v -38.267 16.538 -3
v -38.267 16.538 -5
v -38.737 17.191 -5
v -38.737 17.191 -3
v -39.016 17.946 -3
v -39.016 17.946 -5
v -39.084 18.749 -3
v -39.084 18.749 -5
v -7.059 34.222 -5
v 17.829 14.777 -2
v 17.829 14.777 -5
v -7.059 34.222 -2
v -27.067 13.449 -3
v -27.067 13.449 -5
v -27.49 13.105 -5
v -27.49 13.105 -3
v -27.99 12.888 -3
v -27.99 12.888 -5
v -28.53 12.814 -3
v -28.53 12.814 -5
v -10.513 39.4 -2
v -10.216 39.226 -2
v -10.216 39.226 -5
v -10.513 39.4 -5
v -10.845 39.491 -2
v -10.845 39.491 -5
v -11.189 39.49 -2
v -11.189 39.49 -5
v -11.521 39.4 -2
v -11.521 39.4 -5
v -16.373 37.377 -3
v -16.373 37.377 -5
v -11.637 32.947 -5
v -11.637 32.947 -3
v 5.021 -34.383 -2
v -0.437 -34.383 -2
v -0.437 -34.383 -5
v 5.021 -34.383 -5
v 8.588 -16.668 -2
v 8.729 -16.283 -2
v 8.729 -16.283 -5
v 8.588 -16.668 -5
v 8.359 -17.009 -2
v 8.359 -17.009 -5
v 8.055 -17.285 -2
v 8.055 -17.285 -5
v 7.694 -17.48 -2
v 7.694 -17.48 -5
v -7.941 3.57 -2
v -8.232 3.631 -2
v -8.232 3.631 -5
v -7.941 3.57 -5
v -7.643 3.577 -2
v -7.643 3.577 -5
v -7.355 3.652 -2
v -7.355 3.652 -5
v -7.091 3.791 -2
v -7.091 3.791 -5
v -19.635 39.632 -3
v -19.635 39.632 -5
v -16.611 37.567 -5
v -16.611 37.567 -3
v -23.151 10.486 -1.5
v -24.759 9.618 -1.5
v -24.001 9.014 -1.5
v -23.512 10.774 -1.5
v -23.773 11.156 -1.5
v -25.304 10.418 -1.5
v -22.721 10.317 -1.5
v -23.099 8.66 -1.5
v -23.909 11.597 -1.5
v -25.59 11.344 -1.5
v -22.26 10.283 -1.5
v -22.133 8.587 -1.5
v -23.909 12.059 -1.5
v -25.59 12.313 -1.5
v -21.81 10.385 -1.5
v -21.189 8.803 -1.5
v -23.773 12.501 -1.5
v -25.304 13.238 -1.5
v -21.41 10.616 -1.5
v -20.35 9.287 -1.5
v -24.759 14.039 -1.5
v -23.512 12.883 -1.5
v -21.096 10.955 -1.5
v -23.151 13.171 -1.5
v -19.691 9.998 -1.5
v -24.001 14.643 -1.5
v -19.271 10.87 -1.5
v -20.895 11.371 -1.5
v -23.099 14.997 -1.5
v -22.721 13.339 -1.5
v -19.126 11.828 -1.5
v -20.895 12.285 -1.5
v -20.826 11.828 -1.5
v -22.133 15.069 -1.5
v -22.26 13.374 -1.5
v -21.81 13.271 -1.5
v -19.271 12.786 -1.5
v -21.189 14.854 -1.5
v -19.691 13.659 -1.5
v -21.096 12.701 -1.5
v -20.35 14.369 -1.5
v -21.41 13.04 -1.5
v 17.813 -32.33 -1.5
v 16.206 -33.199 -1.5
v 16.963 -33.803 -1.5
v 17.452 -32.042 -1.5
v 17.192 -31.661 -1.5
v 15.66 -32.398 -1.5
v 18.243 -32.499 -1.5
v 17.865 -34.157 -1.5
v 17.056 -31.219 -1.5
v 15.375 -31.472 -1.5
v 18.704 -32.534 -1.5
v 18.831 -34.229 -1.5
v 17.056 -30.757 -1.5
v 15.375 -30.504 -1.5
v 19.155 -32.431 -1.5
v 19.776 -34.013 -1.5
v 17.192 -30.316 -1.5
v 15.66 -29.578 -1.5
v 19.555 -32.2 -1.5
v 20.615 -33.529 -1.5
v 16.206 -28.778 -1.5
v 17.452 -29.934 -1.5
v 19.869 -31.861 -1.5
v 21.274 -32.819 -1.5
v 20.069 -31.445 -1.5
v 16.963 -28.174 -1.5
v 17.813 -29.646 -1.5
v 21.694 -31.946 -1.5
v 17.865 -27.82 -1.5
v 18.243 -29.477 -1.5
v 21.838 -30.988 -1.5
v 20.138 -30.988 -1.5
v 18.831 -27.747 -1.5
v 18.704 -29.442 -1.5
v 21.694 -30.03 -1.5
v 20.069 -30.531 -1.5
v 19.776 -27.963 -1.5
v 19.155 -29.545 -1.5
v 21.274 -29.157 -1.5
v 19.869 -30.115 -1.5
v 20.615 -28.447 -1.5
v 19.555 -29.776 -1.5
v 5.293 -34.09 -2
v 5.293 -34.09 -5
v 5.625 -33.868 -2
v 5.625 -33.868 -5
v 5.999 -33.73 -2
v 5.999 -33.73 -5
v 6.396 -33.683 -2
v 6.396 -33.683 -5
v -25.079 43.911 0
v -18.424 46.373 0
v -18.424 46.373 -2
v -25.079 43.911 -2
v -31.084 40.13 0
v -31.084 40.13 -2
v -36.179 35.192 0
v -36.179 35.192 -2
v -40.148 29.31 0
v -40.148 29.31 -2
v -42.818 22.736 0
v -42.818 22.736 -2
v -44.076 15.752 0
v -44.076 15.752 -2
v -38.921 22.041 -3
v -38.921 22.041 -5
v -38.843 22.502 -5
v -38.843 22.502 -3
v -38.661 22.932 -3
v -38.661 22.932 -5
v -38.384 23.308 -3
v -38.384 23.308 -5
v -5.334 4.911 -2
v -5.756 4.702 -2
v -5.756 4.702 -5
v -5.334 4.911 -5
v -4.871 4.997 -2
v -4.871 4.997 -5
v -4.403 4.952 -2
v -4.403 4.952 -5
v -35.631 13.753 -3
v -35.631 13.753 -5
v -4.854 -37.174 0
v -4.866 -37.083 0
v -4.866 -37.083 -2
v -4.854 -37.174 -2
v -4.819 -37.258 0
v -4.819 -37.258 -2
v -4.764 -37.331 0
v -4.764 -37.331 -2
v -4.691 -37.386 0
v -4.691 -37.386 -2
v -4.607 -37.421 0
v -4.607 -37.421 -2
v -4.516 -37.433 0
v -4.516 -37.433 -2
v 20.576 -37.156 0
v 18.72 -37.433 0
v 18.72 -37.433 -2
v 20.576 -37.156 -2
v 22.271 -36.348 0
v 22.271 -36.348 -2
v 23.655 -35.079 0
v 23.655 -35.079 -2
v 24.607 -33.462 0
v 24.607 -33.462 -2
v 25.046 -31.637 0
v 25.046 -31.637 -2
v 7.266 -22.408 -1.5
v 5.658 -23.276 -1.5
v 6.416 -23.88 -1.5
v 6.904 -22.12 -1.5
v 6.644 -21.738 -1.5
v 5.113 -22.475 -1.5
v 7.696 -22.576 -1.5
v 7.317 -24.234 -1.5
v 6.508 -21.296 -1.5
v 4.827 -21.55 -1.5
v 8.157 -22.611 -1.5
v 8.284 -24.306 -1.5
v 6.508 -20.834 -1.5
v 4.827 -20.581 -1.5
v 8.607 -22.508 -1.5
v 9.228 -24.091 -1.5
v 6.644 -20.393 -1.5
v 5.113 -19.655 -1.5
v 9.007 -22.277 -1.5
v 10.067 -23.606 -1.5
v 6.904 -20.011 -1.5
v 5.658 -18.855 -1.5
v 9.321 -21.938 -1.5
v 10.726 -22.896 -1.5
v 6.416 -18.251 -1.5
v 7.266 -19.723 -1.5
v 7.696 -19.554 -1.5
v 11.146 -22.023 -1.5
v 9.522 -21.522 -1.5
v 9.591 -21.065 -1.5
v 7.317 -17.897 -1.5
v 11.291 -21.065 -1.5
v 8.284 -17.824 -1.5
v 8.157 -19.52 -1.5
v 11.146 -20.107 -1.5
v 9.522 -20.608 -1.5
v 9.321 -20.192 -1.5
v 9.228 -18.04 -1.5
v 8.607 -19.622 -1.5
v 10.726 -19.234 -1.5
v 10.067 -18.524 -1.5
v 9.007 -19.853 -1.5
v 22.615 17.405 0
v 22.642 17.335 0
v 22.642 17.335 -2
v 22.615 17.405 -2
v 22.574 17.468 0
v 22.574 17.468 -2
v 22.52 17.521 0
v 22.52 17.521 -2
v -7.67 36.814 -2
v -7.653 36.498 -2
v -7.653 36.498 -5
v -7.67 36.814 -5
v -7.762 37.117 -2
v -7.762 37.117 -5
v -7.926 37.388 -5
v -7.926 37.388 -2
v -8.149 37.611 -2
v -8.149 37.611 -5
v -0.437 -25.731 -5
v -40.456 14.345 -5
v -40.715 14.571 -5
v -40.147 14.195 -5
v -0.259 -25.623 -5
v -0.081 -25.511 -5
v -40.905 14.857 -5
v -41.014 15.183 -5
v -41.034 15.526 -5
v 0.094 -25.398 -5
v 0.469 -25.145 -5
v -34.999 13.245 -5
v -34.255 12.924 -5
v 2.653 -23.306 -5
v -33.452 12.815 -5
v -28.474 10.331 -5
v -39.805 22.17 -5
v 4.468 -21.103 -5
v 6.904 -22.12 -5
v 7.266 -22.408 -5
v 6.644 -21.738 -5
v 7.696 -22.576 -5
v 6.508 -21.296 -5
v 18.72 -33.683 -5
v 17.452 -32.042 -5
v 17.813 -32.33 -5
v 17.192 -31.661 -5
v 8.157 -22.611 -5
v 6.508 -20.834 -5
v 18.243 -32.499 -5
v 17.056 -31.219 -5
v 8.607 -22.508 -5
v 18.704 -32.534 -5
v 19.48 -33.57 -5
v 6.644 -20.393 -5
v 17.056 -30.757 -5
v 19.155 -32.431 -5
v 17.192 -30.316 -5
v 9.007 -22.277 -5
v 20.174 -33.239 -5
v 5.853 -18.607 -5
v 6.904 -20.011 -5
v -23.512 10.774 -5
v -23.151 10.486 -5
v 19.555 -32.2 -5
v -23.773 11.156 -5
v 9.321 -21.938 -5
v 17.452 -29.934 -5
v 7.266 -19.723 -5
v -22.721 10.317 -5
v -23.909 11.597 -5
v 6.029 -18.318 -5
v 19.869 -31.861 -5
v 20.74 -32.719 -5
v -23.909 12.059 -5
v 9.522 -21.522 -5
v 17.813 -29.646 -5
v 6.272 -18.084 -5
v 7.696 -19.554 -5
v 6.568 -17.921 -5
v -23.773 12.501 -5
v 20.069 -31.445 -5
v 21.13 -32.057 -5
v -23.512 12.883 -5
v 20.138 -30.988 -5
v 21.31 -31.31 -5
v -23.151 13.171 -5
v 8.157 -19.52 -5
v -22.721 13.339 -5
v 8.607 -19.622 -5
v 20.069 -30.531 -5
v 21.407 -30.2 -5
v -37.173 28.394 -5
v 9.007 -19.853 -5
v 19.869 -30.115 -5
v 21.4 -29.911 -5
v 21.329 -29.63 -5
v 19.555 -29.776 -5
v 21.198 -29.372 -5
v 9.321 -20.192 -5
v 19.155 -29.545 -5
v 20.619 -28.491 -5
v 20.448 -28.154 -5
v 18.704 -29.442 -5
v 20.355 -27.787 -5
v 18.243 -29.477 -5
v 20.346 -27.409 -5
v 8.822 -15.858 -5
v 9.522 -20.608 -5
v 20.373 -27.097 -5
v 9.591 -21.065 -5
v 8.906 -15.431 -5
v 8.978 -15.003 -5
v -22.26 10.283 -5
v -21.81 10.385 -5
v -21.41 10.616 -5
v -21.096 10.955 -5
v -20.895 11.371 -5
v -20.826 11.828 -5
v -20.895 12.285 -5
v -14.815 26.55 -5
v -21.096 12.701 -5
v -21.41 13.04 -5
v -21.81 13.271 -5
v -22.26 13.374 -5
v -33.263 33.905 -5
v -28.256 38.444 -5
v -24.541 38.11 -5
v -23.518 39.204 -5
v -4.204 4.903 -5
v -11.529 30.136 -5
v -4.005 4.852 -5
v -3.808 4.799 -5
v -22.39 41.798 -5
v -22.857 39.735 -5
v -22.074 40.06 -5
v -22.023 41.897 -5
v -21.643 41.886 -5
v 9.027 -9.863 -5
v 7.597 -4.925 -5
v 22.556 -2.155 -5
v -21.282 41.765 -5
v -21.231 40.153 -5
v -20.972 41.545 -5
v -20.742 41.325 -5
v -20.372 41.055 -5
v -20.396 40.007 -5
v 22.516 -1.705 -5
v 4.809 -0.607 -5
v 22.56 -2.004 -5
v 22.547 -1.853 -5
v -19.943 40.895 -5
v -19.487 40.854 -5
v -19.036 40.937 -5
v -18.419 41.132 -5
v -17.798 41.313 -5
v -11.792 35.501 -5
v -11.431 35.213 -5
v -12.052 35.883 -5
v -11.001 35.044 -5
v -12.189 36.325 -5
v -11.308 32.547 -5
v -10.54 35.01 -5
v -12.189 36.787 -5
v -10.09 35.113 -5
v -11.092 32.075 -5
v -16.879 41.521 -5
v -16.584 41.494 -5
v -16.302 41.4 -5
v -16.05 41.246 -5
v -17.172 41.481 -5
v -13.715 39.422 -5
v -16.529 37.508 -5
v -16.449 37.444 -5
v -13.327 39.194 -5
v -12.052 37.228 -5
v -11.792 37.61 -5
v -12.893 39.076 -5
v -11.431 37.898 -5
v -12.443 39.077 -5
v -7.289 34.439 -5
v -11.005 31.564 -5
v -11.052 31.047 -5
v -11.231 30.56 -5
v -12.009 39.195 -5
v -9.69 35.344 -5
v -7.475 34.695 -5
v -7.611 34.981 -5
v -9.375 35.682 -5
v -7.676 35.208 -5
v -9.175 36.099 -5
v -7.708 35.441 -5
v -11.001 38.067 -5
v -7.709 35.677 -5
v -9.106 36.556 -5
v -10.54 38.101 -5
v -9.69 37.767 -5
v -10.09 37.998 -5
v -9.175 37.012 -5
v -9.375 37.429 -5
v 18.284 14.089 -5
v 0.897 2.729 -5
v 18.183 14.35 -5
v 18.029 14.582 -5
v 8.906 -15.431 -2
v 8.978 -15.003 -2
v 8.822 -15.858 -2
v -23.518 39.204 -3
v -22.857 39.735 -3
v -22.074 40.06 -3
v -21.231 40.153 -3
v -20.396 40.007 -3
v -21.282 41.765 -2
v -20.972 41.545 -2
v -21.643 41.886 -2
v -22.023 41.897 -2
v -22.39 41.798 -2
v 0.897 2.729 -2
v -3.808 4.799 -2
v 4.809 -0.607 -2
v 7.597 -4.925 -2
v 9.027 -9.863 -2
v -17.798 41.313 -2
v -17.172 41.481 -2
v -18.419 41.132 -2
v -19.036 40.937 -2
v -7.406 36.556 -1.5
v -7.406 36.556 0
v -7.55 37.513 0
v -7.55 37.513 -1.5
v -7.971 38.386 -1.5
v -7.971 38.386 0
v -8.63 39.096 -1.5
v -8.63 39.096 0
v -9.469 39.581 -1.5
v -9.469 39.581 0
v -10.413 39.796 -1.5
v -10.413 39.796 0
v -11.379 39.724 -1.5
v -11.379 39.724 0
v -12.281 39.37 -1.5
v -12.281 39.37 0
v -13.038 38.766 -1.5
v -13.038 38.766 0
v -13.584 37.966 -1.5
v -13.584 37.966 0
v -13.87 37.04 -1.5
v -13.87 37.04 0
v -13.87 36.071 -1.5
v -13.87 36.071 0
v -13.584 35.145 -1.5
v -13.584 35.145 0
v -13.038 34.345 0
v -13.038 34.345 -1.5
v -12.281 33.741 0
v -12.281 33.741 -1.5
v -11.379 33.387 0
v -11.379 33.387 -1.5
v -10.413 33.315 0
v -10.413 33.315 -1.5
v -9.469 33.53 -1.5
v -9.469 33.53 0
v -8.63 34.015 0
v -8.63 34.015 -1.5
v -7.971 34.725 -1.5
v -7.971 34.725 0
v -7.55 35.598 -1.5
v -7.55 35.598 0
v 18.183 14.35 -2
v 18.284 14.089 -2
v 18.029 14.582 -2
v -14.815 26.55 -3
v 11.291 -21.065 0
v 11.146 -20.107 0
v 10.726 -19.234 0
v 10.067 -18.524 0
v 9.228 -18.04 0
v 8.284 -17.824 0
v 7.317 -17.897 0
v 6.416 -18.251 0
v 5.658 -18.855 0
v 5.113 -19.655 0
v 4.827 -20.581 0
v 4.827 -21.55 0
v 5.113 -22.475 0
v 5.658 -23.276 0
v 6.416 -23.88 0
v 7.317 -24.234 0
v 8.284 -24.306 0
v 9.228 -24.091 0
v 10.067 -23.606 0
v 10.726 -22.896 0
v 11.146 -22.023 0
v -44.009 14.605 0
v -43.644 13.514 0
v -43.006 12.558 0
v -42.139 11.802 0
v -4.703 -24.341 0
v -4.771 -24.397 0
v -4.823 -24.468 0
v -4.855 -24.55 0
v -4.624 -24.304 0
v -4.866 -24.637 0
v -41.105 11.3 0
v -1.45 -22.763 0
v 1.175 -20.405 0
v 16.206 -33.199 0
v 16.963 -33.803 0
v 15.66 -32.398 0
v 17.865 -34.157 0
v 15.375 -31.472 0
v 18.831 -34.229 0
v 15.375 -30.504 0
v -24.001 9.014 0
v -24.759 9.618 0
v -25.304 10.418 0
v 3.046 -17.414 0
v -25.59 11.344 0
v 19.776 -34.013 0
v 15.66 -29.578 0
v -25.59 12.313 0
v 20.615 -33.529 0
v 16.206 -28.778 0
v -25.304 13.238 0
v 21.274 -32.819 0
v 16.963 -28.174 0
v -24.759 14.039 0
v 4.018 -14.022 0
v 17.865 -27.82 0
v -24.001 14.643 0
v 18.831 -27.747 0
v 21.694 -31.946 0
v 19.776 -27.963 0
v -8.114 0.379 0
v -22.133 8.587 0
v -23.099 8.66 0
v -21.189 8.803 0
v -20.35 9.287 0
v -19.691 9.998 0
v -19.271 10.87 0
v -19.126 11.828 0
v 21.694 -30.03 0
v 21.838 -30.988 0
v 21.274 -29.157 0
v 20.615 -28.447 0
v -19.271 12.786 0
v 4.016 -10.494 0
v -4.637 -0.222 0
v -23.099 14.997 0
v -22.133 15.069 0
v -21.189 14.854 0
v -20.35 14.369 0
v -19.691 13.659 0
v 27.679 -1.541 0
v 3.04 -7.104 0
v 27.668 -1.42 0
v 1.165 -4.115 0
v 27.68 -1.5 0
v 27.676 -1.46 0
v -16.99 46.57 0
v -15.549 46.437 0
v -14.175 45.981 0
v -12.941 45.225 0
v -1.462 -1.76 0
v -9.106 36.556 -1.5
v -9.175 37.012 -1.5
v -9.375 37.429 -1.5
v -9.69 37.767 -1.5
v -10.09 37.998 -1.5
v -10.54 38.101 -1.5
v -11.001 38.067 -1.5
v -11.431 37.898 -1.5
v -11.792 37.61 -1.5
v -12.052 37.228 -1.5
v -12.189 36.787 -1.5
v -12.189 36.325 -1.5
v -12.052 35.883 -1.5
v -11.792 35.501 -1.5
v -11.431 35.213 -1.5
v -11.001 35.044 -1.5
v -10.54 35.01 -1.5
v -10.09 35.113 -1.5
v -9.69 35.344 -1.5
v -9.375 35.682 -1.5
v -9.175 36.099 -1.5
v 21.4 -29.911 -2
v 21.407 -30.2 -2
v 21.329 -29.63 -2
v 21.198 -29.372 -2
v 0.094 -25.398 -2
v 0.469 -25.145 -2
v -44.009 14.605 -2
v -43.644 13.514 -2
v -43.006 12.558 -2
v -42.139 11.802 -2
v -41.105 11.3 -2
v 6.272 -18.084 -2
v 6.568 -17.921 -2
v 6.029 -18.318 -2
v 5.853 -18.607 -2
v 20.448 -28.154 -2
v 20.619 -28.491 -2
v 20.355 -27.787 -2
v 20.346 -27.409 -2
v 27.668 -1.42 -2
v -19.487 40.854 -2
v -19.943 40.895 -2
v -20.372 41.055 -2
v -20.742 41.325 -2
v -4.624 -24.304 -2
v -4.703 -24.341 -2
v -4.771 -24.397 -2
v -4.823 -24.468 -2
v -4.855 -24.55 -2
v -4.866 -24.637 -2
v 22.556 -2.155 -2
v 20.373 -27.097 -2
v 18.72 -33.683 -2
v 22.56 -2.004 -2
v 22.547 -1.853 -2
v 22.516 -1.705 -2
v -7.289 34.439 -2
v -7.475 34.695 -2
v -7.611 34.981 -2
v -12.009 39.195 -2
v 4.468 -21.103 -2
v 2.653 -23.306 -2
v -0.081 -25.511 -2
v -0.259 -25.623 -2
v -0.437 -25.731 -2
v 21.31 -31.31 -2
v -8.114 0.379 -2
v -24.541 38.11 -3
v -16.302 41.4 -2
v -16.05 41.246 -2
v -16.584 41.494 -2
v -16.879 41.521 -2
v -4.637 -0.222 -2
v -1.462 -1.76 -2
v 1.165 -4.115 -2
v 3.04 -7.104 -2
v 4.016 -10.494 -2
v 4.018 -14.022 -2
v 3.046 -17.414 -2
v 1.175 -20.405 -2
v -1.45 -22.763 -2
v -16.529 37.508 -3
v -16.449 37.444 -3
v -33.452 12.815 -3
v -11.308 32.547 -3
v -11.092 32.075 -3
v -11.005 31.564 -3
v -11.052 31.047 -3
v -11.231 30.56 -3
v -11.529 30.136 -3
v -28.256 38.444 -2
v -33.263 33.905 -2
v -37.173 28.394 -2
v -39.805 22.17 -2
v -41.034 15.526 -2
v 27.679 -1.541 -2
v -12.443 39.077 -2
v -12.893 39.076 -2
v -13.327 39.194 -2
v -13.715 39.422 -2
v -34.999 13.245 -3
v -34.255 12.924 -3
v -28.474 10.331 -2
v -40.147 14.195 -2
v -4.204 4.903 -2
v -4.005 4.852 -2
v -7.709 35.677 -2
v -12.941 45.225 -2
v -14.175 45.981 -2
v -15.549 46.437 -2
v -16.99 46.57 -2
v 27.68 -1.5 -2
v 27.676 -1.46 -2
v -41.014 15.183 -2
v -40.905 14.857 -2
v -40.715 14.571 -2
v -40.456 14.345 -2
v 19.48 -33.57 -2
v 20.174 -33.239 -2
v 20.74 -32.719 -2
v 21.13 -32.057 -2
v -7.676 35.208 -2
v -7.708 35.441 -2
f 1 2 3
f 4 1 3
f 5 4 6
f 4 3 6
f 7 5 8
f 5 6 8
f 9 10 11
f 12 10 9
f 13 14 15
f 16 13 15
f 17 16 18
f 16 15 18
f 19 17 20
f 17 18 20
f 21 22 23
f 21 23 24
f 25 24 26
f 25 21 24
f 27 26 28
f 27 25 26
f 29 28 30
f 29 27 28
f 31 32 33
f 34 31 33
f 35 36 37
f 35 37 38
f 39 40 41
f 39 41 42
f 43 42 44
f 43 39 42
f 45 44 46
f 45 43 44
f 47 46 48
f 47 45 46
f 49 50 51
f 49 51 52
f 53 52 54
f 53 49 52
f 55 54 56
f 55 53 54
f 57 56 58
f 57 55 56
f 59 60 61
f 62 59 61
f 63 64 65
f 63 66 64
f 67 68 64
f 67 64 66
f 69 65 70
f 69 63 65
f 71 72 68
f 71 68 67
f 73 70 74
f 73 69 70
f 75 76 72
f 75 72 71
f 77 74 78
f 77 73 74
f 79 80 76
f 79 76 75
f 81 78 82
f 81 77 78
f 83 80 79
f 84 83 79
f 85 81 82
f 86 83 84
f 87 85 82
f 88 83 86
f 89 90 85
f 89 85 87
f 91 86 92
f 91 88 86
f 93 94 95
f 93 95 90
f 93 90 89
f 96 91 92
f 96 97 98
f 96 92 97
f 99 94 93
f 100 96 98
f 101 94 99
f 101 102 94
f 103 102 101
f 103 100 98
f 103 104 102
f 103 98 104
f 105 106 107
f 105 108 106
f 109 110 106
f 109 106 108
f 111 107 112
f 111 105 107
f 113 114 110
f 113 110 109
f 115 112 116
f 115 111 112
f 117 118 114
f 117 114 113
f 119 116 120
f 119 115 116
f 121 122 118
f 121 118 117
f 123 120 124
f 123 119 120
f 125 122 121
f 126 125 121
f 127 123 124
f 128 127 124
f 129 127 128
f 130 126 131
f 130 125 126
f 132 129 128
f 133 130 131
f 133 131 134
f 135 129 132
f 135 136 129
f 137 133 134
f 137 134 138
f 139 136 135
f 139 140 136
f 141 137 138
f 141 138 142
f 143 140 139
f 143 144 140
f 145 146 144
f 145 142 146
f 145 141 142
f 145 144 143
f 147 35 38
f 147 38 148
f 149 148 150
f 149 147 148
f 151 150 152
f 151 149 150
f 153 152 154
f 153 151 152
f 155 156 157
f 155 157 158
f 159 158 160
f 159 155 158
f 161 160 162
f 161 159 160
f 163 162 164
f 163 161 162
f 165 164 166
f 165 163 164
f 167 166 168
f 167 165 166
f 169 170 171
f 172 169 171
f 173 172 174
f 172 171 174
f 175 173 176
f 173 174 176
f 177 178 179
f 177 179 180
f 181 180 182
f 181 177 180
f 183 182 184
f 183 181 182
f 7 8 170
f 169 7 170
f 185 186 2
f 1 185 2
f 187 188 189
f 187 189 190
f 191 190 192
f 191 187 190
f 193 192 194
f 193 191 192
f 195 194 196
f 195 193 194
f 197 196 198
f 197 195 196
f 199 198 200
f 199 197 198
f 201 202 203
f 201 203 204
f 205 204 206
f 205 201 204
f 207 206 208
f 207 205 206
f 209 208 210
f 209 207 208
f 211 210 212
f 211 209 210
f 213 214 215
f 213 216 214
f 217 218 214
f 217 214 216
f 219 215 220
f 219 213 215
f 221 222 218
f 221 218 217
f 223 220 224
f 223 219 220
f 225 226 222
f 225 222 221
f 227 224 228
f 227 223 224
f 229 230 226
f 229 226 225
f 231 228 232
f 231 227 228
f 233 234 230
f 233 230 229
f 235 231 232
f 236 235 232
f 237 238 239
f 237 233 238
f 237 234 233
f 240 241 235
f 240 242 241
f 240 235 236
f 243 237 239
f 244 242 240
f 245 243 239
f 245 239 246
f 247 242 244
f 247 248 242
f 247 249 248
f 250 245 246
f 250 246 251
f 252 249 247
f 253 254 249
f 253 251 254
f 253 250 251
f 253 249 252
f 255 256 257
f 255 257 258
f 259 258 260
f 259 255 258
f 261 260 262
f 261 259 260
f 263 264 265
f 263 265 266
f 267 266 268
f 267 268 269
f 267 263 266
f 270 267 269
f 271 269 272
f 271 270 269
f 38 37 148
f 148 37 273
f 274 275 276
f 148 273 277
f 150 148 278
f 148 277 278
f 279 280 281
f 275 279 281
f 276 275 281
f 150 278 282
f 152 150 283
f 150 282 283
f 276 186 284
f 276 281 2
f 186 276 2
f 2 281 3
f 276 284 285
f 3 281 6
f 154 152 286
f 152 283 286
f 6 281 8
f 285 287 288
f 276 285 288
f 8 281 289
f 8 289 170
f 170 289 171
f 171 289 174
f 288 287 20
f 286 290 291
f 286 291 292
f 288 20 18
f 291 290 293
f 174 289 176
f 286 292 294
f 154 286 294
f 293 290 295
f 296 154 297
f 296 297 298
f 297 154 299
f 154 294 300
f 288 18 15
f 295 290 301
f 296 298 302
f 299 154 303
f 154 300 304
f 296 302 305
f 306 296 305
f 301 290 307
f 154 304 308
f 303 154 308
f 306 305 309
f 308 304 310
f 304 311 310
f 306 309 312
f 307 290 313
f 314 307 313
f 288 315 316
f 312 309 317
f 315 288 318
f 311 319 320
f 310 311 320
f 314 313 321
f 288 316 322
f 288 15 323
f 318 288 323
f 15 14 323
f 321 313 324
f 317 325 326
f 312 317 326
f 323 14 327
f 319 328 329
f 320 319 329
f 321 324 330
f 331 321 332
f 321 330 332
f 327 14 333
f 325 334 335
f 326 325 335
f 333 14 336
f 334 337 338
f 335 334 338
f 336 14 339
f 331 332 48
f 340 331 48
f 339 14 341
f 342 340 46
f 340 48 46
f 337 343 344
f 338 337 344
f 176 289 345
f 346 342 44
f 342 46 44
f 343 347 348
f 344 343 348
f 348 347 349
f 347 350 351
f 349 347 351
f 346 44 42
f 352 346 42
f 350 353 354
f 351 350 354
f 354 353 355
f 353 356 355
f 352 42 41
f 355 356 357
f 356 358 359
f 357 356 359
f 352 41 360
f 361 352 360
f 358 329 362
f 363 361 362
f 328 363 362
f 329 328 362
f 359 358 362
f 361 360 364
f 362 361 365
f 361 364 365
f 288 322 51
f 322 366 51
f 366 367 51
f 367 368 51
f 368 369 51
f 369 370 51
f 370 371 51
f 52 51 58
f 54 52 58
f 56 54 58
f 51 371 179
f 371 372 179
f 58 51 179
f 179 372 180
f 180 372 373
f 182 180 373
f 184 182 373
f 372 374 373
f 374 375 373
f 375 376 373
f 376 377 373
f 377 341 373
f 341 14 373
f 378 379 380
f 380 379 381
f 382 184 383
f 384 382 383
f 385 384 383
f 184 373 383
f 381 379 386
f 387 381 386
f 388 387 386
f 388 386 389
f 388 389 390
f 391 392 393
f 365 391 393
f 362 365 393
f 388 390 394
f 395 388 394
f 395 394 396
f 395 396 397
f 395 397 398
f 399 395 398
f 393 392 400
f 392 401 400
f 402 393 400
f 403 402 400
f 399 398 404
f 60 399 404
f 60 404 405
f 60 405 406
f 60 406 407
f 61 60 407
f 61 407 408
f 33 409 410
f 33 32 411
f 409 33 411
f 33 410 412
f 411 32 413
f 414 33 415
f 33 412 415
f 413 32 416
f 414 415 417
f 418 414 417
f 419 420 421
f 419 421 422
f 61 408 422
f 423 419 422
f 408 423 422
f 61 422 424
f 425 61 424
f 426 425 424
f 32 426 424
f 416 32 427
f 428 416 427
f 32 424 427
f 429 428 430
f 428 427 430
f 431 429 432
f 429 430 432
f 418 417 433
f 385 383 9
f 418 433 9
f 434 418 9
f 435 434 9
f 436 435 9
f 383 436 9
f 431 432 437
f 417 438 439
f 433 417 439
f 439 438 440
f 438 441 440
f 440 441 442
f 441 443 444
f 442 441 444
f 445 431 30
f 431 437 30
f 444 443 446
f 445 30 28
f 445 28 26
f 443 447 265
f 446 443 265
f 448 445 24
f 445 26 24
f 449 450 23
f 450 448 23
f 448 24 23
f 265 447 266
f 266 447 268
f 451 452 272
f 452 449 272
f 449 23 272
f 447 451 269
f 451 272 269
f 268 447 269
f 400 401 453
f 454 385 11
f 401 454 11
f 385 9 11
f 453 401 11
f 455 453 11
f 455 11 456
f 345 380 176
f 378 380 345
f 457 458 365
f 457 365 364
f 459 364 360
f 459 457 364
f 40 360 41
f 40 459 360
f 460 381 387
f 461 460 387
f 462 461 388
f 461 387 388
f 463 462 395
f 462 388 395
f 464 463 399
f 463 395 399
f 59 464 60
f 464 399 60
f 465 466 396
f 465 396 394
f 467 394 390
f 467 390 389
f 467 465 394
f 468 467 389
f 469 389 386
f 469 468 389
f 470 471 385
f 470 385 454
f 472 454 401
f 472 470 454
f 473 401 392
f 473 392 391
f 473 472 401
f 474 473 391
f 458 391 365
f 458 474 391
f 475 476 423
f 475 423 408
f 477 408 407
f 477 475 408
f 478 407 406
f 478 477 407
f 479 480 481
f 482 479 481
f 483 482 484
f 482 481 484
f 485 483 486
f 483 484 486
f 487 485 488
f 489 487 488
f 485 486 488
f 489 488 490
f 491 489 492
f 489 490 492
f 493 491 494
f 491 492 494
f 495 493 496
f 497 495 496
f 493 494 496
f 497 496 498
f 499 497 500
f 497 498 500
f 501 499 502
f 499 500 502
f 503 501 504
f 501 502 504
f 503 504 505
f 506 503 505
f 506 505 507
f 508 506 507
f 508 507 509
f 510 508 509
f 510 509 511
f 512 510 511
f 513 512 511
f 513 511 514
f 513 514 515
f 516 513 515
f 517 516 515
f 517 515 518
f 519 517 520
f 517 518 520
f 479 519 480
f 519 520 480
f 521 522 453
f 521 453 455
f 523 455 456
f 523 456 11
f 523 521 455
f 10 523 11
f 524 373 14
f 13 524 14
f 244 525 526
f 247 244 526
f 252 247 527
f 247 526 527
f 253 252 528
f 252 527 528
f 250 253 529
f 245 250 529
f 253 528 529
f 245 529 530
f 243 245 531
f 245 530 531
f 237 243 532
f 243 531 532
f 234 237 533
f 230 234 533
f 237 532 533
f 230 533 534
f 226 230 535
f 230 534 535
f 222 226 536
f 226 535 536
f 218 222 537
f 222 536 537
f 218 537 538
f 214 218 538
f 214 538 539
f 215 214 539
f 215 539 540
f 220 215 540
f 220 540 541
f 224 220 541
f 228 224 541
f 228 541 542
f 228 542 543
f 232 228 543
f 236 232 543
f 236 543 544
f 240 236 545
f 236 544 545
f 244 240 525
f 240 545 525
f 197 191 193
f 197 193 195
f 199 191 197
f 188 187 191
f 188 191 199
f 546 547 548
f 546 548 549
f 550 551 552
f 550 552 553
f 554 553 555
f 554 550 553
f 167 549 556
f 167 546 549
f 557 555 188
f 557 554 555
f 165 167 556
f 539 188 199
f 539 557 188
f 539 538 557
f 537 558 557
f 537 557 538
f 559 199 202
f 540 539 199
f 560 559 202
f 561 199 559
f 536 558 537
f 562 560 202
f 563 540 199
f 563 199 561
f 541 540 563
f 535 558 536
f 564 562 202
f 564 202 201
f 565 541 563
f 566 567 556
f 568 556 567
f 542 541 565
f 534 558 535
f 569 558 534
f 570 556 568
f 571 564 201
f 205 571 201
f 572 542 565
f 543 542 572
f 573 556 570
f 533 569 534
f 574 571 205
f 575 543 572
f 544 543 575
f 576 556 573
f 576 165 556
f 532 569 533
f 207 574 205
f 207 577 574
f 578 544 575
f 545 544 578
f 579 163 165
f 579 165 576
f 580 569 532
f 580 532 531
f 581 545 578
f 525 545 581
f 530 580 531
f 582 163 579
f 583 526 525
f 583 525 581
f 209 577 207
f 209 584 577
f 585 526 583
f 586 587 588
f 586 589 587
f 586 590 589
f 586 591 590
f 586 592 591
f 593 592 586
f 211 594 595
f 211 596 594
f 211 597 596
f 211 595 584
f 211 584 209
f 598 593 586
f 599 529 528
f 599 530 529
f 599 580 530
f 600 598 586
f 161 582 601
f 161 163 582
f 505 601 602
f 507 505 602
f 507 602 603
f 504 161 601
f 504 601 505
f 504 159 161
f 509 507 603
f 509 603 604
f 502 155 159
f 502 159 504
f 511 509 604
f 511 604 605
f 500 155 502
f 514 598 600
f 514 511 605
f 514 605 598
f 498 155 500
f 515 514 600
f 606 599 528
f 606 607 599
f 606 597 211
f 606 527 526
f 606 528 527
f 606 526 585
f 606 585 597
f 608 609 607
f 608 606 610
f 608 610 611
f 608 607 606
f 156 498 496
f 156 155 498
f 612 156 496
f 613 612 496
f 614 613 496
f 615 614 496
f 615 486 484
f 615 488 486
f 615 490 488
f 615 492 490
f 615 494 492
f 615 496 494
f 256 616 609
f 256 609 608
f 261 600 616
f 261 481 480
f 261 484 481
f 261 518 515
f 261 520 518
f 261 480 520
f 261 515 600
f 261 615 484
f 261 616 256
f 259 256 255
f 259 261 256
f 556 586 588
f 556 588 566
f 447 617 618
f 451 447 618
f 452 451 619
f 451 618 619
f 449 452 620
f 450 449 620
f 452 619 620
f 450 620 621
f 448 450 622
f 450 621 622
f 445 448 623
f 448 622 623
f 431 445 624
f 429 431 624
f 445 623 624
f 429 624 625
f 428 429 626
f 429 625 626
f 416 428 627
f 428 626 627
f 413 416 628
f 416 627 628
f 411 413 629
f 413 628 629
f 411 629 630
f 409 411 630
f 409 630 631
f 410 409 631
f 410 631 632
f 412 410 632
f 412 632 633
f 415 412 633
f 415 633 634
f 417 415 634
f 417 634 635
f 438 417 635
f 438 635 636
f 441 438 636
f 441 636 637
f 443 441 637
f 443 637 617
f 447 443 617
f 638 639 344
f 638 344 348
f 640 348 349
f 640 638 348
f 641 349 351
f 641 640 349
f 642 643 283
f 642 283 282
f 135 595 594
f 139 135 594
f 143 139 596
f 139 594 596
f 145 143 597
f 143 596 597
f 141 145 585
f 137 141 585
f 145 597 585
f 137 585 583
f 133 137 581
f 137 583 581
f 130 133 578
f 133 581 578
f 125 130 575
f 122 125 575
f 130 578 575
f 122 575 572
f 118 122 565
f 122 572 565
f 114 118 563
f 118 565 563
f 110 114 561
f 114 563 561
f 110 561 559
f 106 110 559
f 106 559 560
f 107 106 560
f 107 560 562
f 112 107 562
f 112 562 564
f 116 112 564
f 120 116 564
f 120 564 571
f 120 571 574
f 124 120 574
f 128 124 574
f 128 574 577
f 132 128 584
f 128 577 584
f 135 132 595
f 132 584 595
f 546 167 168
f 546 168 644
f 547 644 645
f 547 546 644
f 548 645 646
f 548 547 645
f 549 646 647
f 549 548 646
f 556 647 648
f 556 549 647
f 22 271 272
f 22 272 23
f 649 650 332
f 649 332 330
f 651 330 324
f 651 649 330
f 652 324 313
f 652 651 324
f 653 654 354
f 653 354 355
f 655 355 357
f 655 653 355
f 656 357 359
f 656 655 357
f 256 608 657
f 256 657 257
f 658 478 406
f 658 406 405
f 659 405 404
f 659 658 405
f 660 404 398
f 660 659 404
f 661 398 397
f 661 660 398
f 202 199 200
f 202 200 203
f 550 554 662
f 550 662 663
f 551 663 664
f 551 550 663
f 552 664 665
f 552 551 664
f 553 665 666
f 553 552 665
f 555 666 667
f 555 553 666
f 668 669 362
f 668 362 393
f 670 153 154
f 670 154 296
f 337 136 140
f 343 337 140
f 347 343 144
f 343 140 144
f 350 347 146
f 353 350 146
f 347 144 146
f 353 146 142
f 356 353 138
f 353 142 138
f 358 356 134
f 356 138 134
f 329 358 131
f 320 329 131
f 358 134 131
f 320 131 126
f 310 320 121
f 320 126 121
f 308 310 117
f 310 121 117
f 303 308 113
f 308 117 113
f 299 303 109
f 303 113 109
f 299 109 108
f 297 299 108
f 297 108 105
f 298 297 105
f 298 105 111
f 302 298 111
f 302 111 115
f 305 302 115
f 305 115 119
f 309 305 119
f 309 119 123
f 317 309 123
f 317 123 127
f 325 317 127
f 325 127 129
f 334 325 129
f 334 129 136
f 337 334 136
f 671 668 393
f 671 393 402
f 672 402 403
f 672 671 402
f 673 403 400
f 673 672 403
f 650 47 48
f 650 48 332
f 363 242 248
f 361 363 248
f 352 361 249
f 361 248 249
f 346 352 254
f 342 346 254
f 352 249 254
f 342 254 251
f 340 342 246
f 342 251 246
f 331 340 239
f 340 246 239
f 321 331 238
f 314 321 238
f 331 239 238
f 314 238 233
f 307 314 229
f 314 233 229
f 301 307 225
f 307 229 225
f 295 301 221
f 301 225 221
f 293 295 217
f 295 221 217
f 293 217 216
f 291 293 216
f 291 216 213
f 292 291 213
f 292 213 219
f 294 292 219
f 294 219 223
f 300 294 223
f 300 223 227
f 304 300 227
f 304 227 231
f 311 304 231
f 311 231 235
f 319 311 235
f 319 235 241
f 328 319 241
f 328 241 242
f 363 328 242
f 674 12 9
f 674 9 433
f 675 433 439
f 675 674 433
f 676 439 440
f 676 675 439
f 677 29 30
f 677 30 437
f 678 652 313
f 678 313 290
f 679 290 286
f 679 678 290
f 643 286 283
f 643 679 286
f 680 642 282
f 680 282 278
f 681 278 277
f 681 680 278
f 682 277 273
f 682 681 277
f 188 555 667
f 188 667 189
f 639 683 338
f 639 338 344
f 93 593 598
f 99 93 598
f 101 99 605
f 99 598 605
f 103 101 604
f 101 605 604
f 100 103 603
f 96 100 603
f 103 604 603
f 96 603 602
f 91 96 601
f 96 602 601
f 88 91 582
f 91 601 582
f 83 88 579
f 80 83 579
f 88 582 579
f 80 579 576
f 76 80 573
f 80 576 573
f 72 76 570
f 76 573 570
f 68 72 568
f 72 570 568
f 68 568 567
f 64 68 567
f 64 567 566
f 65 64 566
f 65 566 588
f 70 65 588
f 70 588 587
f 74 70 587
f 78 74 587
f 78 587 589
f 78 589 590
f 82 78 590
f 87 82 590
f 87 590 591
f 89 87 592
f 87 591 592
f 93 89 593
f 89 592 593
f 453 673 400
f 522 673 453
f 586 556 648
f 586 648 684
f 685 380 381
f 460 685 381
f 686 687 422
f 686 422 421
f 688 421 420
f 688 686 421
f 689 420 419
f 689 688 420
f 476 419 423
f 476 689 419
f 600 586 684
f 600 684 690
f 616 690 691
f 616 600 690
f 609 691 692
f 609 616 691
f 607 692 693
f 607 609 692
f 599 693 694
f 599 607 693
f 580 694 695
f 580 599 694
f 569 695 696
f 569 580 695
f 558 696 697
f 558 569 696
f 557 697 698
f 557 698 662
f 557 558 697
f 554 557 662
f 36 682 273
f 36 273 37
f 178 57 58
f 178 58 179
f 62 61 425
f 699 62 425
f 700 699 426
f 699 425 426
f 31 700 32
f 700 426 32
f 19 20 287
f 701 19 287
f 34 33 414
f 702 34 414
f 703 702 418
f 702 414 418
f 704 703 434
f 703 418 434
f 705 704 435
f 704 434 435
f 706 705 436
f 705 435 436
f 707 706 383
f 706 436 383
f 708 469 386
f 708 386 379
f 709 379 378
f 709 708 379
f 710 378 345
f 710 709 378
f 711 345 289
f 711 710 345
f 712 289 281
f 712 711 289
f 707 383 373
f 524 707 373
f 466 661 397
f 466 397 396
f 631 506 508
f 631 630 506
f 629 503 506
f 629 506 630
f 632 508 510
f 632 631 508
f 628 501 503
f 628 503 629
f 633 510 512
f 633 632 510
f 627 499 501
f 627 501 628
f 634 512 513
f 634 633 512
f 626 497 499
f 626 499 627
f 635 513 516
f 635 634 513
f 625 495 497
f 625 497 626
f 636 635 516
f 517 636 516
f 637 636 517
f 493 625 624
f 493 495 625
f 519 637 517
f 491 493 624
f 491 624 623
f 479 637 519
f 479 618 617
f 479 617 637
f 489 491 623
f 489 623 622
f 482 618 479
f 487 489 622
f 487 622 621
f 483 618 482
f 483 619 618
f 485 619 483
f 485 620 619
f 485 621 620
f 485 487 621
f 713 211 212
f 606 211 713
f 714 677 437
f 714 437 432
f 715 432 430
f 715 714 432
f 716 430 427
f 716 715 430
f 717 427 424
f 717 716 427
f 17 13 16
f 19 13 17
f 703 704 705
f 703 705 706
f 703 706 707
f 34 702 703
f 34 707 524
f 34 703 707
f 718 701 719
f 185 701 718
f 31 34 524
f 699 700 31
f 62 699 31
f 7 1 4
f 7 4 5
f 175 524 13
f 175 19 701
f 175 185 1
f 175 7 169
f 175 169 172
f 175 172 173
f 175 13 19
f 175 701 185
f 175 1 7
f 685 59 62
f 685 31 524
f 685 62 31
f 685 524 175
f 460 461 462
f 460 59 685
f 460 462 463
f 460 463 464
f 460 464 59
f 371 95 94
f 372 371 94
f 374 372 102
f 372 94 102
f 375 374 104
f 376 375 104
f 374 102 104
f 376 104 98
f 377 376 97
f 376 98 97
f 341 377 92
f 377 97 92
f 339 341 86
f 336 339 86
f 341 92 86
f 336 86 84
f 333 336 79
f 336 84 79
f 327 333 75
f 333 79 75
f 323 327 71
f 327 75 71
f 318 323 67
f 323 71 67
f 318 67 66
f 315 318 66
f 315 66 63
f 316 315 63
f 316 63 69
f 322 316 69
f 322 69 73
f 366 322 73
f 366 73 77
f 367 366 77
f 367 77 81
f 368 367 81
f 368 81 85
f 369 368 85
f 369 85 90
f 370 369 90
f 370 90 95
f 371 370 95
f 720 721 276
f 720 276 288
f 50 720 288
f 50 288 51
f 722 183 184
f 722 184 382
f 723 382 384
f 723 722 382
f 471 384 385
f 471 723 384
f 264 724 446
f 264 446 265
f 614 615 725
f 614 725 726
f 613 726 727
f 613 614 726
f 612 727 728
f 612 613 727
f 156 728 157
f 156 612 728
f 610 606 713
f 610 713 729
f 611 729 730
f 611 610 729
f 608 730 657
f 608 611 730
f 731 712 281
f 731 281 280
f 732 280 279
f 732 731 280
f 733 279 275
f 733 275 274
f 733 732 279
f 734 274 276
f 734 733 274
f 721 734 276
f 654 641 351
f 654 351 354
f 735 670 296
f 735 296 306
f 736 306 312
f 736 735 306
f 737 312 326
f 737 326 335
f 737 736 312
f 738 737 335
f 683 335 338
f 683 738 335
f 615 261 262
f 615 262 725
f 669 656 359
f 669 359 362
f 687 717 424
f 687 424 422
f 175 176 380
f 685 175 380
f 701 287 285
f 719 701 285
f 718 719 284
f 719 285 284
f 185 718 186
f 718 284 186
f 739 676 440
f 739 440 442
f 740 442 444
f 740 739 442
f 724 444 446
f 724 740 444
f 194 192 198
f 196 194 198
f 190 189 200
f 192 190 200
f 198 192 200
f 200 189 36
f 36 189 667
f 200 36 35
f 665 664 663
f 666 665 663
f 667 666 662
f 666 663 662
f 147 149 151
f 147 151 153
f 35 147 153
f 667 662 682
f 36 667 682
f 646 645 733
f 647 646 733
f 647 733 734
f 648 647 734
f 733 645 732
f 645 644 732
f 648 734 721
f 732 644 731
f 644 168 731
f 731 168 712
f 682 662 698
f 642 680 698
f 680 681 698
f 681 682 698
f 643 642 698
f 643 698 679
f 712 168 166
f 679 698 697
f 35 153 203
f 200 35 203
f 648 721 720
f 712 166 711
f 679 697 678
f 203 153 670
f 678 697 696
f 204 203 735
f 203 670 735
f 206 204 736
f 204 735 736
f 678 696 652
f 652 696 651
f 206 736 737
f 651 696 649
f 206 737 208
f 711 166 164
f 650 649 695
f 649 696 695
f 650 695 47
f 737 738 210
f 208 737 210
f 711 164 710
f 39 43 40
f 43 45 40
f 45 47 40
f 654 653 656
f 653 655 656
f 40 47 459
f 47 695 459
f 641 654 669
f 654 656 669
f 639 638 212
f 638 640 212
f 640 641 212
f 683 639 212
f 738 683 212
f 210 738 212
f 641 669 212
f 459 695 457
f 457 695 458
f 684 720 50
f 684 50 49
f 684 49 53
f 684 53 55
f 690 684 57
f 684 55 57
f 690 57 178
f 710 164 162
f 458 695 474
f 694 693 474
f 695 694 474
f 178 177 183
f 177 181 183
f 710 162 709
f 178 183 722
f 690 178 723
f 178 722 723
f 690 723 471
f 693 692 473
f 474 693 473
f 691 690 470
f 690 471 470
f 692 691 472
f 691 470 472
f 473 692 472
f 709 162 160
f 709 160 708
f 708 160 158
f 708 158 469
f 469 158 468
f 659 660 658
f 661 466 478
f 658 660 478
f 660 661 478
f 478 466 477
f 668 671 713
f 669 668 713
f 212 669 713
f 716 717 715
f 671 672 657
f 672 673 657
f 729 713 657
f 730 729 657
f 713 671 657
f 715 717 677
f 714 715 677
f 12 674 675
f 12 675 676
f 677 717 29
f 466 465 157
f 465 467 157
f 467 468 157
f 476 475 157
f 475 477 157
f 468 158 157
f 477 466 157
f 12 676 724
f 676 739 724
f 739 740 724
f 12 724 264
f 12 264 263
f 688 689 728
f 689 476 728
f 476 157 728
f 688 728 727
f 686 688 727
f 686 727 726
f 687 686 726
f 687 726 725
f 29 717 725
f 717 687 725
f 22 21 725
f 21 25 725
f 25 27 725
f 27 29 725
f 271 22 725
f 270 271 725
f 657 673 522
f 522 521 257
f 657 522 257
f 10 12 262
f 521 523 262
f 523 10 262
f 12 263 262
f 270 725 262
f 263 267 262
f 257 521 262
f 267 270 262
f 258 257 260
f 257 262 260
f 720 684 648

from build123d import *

# Parameters (mm, degrees)
Y_KSEKLIK_EKSTR_ZYON1_DEPTH = 2
Y_KSEKLIK_EKSTR_ZYON2_DEPTH = 3
IZIM5_R                     = 1.55
KES_EKSTR_ZYON1_DEPTH       = 5
IZIM6_R                     = 3.25
KES_EKSTR_ZYON2_DEPTH       = 1.5
KES_EKSTR_ZYON3_DEPTH       = 2


with BuildPart() as part:
    # Çizim1 → Yükseklik-Ekstrüzyon1 (new body)
    with BuildSketch(Plane.XY):
        with BuildLine():
            Line((-41.105081413, 11.299639377), (-8.113863068, 0.378628673))
            ThreePointArc((-8.113863068, 0.378628673), (4.01642262, -10.494132055), (-4.623817667, -24.303802743))
            ThreePointArc((-4.623817667, -24.303802743), (-4.799274482, -24.430880762), (-4.866322935, -24.63688664))
            Line((-4.866322935, -24.63688664), (-4.866322935, -37.083207178))
            ThreePointArc((-4.866322935, -37.083207178), (-4.763810308, -37.330694551), (-4.516322935, -37.433207178))
            Line((-4.516322935, -37.433207178), (18.719678074, -37.433207178))
            ThreePointArc((18.719678074, -37.433207178), (23.009675893, -35.764918267), (25.045514407, -31.636646144))
            Line((25.045514407, -31.636646144), (27.678537645, -1.541052822))
            ThreePointArc((27.678537645, -1.541052822), (27.678537645, -1.480043802), (27.66794354, -1.419961646))
            Line((27.66794354, -1.419961646), (22.642489235, 17.335289151))
            ThreePointArc((22.642489235, 17.335289151), (22.596275233, 17.43788043), (22.519896712, 17.520506249))
            Line((22.519896712, 17.520506249), (-12.9405872, 45.225272639))
            ThreePointArc((-12.9405872, 45.225272639), (-15.548952522, 46.436682119), (-18.424200647, 46.373193573))
            ThreePointArc((-18.424200647, 46.373193573), (-36.179435446, 35.192251208), (-44.076039074, 15.752459901))
            ThreePointArc((-44.076039074, 15.752459901), (-43.356576828, 13.014957214), (-41.105081413, 11.299639377))
        make_face()
    extrude(amount=-Y_KSEKLIK_EKSTR_ZYON1_DEPTH)

    # Çizim4 → Yükseklik-Ekstrüzyon2 (add)
    with BuildSketch(Plane(origin=(0, 0, -2), x_dir=(-1, 0, 0), z_dir=(0, 0, -1))):
        with BuildLine():
            Line((40.146596848, 14.195119879), (28.474092029, 10.331196191))
            Line((28.474092029, 10.331196191), (8.232284194, 3.630594906))
            ThreePointArc((8.232284194, 3.630594906), (7.642809613, 3.577387775), (7.090841177, 3.791027954))
            Line((7.090841177, 3.791027954), (5.755688832, 4.702398932))
            ThreePointArc((5.755688832, 4.702398932), (5.105662961, 4.970115176), (4.402900206, 4.951945686))
            ThreePointArc((4.402900206, 4.951945686), (4.10459824, 4.878061515), (3.807624001, 4.799009418))
            ThreePointArc((3.807624001, 4.799009418), (-6.360722696, -2.664063163), (-8.978039182, -15.002717113))
            ThreePointArc((-8.978039182, -15.002717113), (-8.865317675, -15.645084598), (-8.729007726, -16.282863339))
            ThreePointArc((-8.729007726, -16.282863339), (-8.359304972, -17.008921436), (-7.694222234, -17.479565078))
            Line((-7.694222234, -17.479565078), (-6.567842625, -17.921440305))
            ThreePointArc((-6.567842625, -17.921440305), (-6.142840412, -18.193337265), (-5.853364231, -18.606566472))
            ThreePointArc((-5.853364231, -18.606566472), (-3.610330722, -22.245790214), (-0.468752496, -25.145037533))
            Line((-0.468752496, -25.145037533), (-0.094474949, -25.398000973))
            ThreePointArc((-0.094474949, -25.398000973), (0.169709223, -25.567322514), (0.437224607, -25.73133038))
            Line((0.437224607, -25.73133038), (0.437224607, -34.383207178))
            Line((0.437224607, -34.383207178), (-5.021308607, -34.383207178))
            ThreePointArc((-5.021308607, -34.383207178), (-5.624718884, -33.868281437), (-6.396081315, -33.683207178))
            Line((-6.396081315, -33.683207178), (-6.780735729, -33.683207178))
            Line((-6.780735729, -33.683207178), (-14.98347518, -33.683207178))
            Line((-14.98347518, -33.683207178), (-18.719678074, -33.683207178))
            ThreePointArc((-18.719678074, -33.683207178), (-20.476212614, -33.000128254), (-21.309784289, -31.309812109))
            Line((-21.309784289, -31.309812109), (-21.406910581, -30.199653517))
            ThreePointArc((-21.406910581, -30.199653517), (-21.372380233, -29.76841651), (-21.198254298, -29.37238891))
            Line((-21.198254298, -29.37238891), (-20.618946502, -28.490888179))
            ThreePointArc((-20.618946502, -28.490888179), (-20.391243356, -27.973005932), (-20.346088286, -27.409080615))
            Line((-20.346088286, -27.409080615), (-20.37341709, -27.096710955))
            Line((-20.37341709, -27.096710955), (-22.555546966, -2.154852341))
            ThreePointArc((-22.555546966, -2.154852341), (-22.555546966, -1.92824741), (-22.516197432, -1.705085117))
            Line((-22.516197432, -1.705085117), (-18.284161659, 14.089087411))
            ThreePointArc((-18.284161659, 14.089087411), (-18.112509653, 14.470140733), (-17.828818002, 14.777036632))
            Line((-17.828818002, 14.777036632), (7.059291739, 34.221759043))
            ThreePointArc((7.059291739, 34.221759043), (7.388432983, 34.562743961), (7.61065263, 34.981340548))
            ThreePointArc((7.61065263, 34.981340548), (7.696032795, 35.32414247), (7.70871782, 35.677189239))
            Line((7.70871782, 35.677189239), (7.652642966, 36.498398251))
            ThreePointArc((7.652642966, 36.498398251), (7.762446578, 37.116689055), (8.149262911, 37.611374283))
            Line((8.149262911, 37.611374283), (10.2163345, 39.226347605))
            ThreePointArc((10.2163345, 39.226347605), (10.845026685, 39.490549235), (11.520958616, 39.400147972))
            Line((11.520958616, 39.400147972), (12.009191337, 39.194676987))
            ThreePointArc((12.009191337, 39.194676987), (12.893102324, 39.07645995), (13.715238257, 39.421954389))
            Line((13.715238257, 39.421954389), (16.049677651, 41.245818333))
            ThreePointArc((16.049677651, 41.245818333), (16.583673701, 41.493823423), (17.172307175, 41.480825768))
            ThreePointArc((17.172307175, 41.480825768), (18.108862659, 41.224498821), (19.036372112, 40.937156005))
            ThreePointArc((19.036372112, 40.937156005), (19.943021213, 40.894666775), (20.742308561, 41.32473382))
            Line((20.742308561, 41.32473382), (20.971778793, 41.544527828))
            ThreePointArc((20.971778793, 41.544527828), (21.642700826, 41.88550301), (22.390140455, 41.797557284))
            ThreePointArc((22.390140455, 41.797557284), (35.367714895, 31.255849206), (41.034469252, 15.525847852))
            ThreePointArc((41.034469252, 15.525847852), (40.819457547, 14.7077436), (40.146596848, 14.195119879))
        make_face()
    extrude(amount=Y_KSEKLIK_EKSTR_ZYON2_DEPTH)

    # Çizim5 → Kes-Ekstrüzyon1 (cut)
    with BuildSketch(Plane.XY):
        with Locations((18.588315087, -30.988106158)):
            Circle(IZIM5_R)
        with Locations((8.040668379, -21.065272587)):
            Circle(IZIM5_R)
        with Locations((-22.376194422, 11.828332979)):
            Circle(IZIM5_R)
        with Locations((-10.655916137, 36.555534849)):
            Circle(IZIM5_R)
    extrude(amount=-KES_EKSTR_ZYON1_DEPTH, mode=Mode.SUBTRACT)

    # Çizim6 → Kes-Ekstrüzyon2 (cut)
    with BuildSketch(Plane.XY):
        with Locations((18.588315087, -30.988106158)):
            Circle(IZIM6_R)
        with Locations((8.040668379, -21.065272587)):
            Circle(IZIM6_R)
        with Locations((-22.376194422, 11.828332979)):
            Circle(IZIM6_R)
        with Locations((-10.655916137, 36.555534849)):
            Circle(IZIM6_R)
    extrude(amount=-KES_EKSTR_ZYON2_DEPTH, mode=Mode.SUBTRACT)

    # Çizim7 → Kes-Ekstrüzyon3 (cut)
    with BuildSketch(Plane(origin=(0, 0, -5), x_dir=(-1, 0, 0), z_dir=(0, 0, -1))):
        with BuildLine():
            Line((24.541267724, 38.1096017), (23.517717526, 39.20403478))
            ThreePointArc((23.517717526, 39.20403478), (21.655481578, 40.136777833), (19.634741325, 39.632257115))
            Line((19.634741325, 39.632257115), (16.611199337, 37.567393667))
            ThreePointArc((16.611199337, 37.567393667), (16.488455807, 37.476506841), (16.373005674, 37.376518561))
            Line((16.373005674, 37.376518561), (11.637268483, 32.947499711))
            ThreePointArc((11.637268483, 32.947499711), (11.004872743, 31.563837931), (11.528839766, 30.135586253))
            Line((11.528839766, 30.135586253), (14.814792499, 26.549635137))
            Line((14.814792499, 26.549635137), (27.066921229, 13.449022186))
            ThreePointArc((27.066921229, 13.449022186), (27.732524284, 12.979727648), (28.529940113, 12.814219991))
            Line((28.529940113, 12.814219991), (33.452123381, 12.814639194))
            ThreePointArc((33.452123381, 12.814639194), (34.638107313, 13.059129065), (35.630822107, 13.752562927))
            Line((35.630822107, 13.752562927), (38.266714728, 16.537857285))
            ThreePointArc((38.266714728, 16.537857285), (38.901592885, 17.559574312), (39.084076841, 18.748555205))
            Line((39.084076841, 18.748555205), (38.920753656, 22.041264477))
            ThreePointArc((38.920753656, 22.041264477), (38.764745082, 22.722405414), (38.383934887, 23.308302374))
            Line((38.383934887, 23.308302374), (24.541267724, 38.1096017))
        make_face()
    extrude(amount=-KES_EKSTR_ZYON3_DEPTH, mode=Mode.SUBTRACT)


solid = part.part
